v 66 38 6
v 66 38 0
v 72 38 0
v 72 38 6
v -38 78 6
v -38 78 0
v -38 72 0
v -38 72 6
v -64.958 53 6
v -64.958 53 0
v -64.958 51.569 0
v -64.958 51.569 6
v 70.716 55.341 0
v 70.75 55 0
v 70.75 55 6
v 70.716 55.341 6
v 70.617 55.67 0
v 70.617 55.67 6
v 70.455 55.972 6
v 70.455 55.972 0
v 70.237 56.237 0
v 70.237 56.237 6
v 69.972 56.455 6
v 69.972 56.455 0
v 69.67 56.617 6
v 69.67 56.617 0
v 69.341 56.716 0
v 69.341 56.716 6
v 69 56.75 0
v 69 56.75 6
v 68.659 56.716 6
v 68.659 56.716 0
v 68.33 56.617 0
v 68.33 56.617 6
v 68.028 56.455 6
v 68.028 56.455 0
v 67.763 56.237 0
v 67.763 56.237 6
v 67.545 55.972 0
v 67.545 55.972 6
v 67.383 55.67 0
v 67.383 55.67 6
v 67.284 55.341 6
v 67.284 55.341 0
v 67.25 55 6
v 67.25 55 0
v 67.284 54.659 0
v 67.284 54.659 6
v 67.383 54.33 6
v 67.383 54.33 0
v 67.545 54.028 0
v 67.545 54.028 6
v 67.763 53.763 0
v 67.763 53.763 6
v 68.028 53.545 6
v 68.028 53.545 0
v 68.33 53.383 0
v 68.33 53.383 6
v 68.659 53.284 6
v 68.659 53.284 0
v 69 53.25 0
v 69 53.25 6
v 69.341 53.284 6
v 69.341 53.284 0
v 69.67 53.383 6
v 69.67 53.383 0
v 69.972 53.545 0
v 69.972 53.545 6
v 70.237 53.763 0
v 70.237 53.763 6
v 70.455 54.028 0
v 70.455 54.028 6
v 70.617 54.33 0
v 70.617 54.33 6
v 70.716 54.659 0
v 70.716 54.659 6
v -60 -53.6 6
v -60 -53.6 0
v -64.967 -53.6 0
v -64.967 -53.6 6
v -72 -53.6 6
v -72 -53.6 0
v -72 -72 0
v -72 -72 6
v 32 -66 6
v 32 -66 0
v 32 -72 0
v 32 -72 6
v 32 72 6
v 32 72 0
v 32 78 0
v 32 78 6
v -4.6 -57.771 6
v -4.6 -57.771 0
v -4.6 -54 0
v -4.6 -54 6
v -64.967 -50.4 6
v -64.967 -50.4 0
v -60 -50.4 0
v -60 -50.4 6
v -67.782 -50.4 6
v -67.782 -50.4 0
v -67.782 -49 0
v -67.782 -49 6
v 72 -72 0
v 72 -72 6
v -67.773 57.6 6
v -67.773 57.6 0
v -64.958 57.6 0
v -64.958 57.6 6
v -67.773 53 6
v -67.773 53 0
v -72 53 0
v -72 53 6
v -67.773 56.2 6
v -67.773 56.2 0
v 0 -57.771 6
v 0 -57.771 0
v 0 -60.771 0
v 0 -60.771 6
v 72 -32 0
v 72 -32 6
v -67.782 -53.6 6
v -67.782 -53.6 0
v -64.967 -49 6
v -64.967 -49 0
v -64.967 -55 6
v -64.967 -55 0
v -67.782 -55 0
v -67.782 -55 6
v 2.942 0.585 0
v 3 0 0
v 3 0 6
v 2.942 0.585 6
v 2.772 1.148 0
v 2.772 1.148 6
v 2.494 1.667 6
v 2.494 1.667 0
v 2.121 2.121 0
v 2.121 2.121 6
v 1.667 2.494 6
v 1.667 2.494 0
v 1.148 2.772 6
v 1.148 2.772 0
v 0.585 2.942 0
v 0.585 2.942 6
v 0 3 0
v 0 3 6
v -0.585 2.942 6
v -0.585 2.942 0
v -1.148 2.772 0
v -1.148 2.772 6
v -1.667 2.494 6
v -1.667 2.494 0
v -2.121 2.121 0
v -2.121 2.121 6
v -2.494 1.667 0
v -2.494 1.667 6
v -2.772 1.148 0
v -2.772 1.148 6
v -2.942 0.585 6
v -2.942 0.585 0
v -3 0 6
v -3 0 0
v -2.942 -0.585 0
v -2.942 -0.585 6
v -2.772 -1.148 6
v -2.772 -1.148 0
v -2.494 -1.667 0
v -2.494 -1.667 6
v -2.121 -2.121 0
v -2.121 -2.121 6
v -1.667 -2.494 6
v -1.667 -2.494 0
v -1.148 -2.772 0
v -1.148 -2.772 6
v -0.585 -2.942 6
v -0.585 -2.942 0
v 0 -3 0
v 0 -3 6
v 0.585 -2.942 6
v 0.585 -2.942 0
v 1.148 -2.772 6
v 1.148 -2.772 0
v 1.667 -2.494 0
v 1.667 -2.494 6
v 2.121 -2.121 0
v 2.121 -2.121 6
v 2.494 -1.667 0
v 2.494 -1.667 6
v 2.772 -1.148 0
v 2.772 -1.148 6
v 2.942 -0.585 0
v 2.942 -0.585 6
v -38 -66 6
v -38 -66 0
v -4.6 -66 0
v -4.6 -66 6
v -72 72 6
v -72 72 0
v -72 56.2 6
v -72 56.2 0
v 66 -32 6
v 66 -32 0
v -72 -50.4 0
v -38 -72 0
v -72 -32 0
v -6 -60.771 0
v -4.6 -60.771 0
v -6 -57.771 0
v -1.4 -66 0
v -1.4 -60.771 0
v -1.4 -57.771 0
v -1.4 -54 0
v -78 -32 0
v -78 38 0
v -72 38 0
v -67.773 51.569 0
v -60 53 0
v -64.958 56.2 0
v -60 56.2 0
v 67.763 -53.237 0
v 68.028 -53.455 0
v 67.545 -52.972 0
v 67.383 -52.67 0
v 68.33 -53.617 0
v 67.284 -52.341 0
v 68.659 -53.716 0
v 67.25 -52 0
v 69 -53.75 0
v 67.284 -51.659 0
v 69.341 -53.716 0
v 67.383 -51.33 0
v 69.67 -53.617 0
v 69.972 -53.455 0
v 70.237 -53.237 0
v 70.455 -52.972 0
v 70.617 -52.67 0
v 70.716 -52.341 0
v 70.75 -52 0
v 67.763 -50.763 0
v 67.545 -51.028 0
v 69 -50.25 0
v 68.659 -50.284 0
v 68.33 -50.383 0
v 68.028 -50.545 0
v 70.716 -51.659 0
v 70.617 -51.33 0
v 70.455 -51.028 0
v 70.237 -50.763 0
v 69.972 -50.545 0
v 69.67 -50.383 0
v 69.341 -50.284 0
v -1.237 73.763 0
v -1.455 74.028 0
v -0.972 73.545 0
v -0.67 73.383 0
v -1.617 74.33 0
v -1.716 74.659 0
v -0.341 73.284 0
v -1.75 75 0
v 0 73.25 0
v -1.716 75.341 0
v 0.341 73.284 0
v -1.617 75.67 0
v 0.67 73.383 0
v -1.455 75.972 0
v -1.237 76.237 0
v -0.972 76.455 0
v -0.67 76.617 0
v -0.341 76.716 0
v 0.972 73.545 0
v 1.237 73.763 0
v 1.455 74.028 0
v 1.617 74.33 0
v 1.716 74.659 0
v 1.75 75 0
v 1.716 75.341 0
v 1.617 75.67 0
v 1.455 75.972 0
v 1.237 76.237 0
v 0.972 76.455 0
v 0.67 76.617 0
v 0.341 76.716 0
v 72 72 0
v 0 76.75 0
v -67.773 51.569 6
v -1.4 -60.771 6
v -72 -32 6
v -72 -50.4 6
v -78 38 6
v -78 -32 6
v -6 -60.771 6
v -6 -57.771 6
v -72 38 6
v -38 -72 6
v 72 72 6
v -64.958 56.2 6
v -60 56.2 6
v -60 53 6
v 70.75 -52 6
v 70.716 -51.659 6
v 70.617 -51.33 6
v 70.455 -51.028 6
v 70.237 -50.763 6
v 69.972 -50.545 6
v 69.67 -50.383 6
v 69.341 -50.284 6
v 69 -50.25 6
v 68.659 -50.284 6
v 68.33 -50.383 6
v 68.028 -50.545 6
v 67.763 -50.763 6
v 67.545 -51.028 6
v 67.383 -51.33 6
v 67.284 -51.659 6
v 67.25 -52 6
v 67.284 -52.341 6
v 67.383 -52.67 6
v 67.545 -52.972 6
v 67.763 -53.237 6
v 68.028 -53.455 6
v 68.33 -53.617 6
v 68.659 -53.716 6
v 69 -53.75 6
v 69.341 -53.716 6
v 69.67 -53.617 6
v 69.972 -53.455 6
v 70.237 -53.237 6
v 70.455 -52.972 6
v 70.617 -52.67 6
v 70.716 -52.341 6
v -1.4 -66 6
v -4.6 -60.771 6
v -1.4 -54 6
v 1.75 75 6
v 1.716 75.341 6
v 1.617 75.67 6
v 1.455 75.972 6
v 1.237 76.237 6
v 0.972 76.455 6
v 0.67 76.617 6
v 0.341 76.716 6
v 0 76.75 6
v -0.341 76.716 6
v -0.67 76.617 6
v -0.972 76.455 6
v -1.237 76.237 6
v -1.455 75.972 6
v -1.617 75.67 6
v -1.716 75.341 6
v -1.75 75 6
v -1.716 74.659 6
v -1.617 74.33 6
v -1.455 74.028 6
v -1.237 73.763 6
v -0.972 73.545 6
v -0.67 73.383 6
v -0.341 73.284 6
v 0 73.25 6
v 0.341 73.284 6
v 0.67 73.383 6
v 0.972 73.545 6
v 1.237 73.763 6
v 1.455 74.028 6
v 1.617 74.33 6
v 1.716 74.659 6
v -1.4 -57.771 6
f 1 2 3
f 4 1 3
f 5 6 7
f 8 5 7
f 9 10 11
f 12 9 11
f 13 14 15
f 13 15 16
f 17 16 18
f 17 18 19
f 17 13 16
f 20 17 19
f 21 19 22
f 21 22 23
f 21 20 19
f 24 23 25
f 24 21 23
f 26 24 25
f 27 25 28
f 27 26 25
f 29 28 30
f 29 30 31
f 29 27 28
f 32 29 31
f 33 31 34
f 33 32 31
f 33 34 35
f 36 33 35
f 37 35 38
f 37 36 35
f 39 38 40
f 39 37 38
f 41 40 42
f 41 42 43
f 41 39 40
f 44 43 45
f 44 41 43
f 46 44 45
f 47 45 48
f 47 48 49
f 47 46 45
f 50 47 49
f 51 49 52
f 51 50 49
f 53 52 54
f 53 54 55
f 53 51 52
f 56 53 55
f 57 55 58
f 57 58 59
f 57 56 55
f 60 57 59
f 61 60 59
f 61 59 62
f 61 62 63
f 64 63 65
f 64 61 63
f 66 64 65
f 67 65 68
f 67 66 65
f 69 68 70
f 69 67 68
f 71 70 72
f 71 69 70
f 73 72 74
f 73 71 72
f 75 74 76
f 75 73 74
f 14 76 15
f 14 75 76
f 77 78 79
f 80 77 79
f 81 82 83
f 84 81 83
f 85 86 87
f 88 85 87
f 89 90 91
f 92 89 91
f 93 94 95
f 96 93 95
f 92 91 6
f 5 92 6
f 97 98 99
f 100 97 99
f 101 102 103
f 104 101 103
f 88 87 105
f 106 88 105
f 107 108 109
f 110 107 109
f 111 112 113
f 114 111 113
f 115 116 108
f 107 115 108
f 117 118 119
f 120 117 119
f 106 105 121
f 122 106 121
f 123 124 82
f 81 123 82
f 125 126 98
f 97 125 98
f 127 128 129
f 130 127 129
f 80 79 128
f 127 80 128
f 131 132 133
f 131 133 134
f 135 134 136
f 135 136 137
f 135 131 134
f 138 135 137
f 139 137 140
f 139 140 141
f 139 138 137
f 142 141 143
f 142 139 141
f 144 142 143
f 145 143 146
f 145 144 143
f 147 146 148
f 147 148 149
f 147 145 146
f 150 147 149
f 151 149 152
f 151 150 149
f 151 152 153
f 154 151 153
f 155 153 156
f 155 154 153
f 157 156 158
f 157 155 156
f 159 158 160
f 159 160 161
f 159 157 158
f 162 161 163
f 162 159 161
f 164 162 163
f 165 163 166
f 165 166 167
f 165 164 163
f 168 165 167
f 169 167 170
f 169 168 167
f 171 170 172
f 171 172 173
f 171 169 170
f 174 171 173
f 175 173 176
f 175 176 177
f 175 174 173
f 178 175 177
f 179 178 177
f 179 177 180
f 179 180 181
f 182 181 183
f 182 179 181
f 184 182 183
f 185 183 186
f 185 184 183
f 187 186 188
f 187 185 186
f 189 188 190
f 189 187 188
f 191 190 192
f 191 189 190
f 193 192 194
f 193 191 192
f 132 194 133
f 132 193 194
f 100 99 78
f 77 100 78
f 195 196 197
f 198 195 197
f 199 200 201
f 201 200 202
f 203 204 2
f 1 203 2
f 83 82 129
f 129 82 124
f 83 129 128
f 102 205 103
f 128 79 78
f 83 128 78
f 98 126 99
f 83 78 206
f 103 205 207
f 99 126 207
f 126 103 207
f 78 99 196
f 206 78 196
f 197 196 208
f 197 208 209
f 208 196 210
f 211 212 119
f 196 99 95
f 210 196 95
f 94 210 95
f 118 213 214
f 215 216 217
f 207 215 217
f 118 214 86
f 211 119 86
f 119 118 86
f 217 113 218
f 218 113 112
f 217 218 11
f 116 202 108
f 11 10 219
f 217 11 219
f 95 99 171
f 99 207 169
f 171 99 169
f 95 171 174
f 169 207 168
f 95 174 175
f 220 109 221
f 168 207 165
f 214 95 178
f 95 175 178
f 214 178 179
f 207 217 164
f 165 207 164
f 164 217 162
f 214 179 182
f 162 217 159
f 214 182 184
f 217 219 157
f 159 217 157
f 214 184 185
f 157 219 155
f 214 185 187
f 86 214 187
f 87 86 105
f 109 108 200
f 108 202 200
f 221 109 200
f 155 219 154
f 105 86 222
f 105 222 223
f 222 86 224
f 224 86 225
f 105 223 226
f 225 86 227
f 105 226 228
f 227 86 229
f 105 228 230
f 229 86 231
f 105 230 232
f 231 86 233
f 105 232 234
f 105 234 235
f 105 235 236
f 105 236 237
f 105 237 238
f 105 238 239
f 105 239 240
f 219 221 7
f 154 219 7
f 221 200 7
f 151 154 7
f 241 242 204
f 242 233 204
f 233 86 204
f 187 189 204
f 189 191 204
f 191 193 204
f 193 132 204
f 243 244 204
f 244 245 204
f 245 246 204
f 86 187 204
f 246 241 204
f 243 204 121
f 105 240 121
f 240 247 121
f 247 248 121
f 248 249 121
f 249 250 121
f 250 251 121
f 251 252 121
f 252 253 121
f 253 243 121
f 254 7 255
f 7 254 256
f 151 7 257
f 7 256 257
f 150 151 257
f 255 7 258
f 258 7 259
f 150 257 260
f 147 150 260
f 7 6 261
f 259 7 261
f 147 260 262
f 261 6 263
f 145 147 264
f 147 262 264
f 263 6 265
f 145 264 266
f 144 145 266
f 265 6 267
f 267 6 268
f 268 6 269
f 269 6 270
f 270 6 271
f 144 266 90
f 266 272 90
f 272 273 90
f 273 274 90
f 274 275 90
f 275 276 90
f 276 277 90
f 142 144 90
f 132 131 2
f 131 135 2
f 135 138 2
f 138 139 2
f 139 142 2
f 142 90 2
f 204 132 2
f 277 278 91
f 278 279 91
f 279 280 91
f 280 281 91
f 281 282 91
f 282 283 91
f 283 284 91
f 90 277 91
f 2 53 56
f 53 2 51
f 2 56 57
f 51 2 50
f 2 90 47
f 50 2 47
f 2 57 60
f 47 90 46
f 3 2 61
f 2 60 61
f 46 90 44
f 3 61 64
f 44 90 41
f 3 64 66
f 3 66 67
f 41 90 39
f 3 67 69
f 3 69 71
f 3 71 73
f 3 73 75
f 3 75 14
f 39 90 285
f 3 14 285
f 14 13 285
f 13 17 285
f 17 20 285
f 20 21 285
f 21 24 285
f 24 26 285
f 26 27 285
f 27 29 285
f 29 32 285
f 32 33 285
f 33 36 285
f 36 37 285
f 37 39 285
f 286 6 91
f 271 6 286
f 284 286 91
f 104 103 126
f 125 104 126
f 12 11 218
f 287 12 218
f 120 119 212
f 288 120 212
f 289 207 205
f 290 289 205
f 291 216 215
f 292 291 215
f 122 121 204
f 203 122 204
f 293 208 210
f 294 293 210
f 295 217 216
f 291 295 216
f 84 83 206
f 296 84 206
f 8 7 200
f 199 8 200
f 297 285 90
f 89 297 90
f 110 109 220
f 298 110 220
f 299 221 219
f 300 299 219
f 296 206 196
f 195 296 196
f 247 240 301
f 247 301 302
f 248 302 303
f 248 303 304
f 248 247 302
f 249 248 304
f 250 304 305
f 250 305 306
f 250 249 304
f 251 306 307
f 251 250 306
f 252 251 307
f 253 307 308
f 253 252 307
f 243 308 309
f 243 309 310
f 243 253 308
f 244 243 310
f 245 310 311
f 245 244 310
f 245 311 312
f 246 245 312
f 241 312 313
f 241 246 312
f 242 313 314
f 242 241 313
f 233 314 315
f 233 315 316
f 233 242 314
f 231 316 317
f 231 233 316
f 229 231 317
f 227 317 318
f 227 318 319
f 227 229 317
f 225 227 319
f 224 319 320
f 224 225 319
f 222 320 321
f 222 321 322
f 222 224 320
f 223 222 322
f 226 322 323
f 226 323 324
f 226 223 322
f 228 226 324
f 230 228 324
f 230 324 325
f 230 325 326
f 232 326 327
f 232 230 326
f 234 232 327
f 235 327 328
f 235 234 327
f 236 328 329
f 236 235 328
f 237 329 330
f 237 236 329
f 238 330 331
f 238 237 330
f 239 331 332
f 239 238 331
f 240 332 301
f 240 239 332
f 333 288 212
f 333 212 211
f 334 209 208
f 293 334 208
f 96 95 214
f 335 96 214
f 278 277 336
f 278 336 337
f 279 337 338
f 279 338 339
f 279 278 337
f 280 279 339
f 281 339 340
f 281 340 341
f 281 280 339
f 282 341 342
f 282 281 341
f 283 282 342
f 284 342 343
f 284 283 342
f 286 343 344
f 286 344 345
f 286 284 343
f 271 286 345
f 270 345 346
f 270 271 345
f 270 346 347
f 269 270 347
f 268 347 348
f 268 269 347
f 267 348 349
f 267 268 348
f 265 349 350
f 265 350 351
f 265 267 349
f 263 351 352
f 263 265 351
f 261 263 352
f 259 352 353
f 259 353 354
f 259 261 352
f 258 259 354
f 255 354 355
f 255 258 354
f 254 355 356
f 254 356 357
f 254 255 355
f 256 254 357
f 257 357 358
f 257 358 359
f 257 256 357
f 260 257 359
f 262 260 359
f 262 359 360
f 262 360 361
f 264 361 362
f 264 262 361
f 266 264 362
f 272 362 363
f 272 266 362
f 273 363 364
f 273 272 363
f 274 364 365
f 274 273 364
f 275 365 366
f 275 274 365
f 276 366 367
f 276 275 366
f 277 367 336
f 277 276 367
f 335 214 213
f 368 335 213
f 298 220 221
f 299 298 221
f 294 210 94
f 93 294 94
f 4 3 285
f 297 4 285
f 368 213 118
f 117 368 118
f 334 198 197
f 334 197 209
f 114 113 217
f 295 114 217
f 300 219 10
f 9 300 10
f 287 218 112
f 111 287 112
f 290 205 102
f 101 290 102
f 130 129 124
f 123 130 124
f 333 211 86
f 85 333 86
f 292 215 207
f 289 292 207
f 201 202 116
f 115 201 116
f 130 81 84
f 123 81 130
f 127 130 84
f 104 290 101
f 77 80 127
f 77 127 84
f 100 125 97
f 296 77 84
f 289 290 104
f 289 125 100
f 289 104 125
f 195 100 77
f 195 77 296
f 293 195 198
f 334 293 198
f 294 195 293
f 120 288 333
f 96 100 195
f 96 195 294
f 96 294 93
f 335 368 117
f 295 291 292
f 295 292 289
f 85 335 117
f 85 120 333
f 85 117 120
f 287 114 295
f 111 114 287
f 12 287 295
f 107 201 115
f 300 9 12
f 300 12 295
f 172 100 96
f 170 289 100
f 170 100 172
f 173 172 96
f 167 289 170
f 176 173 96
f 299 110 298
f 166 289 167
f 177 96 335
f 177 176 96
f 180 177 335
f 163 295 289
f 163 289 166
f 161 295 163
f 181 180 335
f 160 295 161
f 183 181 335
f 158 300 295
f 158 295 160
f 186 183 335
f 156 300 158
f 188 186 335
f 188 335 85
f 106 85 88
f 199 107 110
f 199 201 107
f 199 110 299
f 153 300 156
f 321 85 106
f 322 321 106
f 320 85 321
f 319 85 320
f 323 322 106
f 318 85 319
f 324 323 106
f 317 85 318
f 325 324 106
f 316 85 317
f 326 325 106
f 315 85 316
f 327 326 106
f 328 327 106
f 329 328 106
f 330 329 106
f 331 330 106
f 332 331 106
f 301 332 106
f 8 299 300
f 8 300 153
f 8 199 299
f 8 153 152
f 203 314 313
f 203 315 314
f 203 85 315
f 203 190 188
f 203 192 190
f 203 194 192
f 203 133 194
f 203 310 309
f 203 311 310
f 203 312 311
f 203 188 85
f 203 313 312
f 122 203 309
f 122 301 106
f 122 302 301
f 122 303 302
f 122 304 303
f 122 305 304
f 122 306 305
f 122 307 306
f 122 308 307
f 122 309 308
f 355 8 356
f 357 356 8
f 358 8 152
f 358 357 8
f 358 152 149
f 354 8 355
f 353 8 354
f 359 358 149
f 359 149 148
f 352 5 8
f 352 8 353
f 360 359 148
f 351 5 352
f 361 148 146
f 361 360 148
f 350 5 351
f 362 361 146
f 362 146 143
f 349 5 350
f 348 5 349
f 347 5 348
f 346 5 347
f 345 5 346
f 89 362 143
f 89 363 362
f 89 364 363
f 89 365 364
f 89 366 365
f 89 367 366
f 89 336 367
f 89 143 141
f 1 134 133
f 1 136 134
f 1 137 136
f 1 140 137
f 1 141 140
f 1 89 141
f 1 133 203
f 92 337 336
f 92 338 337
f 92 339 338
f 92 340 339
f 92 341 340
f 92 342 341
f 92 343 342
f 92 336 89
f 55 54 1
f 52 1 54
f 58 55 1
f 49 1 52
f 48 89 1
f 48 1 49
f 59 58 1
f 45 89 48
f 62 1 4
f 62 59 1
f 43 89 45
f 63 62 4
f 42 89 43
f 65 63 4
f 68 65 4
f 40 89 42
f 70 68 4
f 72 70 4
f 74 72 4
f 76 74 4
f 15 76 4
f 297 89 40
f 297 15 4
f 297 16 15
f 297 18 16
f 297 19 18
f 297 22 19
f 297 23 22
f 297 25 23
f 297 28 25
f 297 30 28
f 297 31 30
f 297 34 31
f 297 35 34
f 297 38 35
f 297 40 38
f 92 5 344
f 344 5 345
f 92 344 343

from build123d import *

# Parameters (mm, degrees)
SKETCH1_R           = 1.75
SKETCH1_R_2         = 3
BOSS_EXTRUDE2_DEPTH = 6


with BuildPart() as part:
    # Sketch1 → Boss-Extrude2 (new body)
    with BuildSketch(Plane.XY):
        Polygon((72, 72), (32, 72), (32, 78), (-38, 78), (-38, 72), (-72, 72), (-72, 56.2), (-67.772810154, 56.2), (-67.772810154, 57.6), (-64.957983727, 57.6), (-64.957983727, 56.2), (-60, 56.2), (-60, 53), (-64.957983727, 53), (-64.957983727, 51.568504207), (-67.772810154, 51.568504207), (-67.772810154, 53), (-72, 53), (-72, 38), (-78, 38), (-78, -32), (-72, -32), (-72, -50.4), (-67.78187279, -50.4), (-67.78187279, -49), (-64.967046362, -49), (-64.967046362, -50.4), (-60, -50.4), (-60, -53.6), (-64.967046362, -53.6), (-64.967046362, -55), (-67.78187279, -55), (-67.78187279, -53.6), (-72, -53.6), (-72, -72), (-38, -72), (-38, -66), (-4.6, -66), (-4.6, -60.77149924), (-6, -60.77149924), (-6, -57.77149924), (-4.6, -57.77149924), (-4.6, -54), (-1.4, -54), (-1.4, -57.77149924), (0, -57.77149924), (0, -60.77149924), (-1.4, -60.77149924), (-1.4, -66), (32, -66), (32, -72), (72, -72), (72, -32), (66, -32), (66, 38), (72, 38), align=None)
        with Locations((69, -52)):
            Circle(SKETCH1_R, mode=Mode.SUBTRACT)
        Circle(SKETCH1_R_2, mode=Mode.SUBTRACT)
        with Locations((69, 55)):
            Circle(SKETCH1_R, mode=Mode.SUBTRACT)
        with Locations((0, 75)):
            Circle(SKETCH1_R, mode=Mode.SUBTRACT)
    extrude(amount=BOSS_EXTRUDE2_DEPTH)


solid = part.part
